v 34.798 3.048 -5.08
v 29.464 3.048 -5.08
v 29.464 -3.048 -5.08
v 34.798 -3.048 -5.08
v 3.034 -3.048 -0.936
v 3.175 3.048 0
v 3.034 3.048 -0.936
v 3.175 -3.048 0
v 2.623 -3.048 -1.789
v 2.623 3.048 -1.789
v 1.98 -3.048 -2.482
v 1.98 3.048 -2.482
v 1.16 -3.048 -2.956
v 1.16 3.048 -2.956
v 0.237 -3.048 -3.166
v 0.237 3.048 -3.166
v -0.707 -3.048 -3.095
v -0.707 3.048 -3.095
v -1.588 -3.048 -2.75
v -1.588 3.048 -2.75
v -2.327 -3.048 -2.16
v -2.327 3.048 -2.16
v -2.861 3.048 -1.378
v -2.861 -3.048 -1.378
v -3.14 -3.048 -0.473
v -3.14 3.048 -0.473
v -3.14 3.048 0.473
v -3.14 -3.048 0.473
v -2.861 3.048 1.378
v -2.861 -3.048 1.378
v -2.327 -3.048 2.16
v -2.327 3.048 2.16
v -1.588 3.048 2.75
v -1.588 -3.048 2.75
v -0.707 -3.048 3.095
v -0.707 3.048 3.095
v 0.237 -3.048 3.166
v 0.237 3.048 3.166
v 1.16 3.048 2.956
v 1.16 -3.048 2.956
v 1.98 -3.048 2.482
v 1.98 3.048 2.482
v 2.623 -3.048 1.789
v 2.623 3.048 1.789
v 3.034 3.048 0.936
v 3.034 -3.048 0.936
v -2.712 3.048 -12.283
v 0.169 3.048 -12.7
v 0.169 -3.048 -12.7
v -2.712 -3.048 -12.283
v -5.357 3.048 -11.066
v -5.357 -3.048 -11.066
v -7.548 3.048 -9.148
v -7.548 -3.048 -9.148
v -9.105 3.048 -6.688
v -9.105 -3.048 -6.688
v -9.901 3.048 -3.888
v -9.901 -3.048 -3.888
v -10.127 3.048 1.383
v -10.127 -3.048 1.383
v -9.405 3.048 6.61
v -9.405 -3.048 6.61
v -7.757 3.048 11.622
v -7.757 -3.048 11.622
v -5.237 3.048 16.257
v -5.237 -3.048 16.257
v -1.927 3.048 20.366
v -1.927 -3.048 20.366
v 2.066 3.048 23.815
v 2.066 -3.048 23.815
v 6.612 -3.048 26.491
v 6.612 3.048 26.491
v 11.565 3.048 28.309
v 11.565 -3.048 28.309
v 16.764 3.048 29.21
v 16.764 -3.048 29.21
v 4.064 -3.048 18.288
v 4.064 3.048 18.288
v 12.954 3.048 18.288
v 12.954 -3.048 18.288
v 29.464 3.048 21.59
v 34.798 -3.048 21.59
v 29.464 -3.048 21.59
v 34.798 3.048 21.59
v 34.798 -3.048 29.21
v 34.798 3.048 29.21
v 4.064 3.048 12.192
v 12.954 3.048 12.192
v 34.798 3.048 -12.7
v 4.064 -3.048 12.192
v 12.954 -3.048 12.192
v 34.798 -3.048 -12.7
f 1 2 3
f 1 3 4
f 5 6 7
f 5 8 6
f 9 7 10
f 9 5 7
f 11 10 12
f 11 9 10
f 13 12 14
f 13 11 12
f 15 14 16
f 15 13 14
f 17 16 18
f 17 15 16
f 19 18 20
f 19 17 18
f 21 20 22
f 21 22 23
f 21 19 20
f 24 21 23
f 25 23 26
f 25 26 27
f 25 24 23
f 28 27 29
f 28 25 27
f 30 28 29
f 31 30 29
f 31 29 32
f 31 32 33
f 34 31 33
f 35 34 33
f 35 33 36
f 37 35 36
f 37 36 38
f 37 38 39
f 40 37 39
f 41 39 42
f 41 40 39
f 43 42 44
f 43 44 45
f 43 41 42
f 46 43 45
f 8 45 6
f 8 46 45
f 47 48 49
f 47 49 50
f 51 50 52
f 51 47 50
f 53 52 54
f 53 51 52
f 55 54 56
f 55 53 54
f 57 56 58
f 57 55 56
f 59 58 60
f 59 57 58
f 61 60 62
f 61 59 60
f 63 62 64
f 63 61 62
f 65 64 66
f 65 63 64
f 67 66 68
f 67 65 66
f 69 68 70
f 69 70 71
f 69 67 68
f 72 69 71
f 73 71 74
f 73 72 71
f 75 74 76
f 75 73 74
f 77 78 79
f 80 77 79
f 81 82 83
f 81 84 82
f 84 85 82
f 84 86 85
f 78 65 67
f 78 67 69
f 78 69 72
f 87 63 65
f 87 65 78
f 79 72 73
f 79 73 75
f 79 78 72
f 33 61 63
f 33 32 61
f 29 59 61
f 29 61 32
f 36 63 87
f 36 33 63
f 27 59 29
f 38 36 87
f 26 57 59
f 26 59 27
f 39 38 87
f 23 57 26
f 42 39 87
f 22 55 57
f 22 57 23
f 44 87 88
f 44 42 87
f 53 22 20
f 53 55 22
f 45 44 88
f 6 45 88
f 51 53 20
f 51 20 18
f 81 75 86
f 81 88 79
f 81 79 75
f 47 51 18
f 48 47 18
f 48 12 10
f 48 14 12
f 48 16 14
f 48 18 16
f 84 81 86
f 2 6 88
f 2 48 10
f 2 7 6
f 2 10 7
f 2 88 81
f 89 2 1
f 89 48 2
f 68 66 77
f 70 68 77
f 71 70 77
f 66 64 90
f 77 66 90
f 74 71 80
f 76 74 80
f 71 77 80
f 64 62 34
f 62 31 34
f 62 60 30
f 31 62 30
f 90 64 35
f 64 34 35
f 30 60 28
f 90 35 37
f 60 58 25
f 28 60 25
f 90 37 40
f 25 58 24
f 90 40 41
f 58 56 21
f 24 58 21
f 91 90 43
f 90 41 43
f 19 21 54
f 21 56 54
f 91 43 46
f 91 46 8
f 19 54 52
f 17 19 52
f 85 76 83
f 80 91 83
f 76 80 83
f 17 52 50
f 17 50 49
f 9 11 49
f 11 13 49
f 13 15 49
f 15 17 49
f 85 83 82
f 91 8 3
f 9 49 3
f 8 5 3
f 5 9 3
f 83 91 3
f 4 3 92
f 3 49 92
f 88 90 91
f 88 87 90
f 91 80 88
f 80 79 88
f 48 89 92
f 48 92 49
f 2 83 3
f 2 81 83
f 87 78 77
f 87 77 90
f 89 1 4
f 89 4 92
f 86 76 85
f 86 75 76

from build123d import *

# Parameters (mm, degrees)
SKETCH1_R           = 3.175
SKETCH1_W           = 8.89
SKETCH1_H           = 6.096
BOSS_EXTRUDE1_DEPTH = 3.048


with BuildPart() as part:
    # Sketch1 → Boss-Extrude1 (new, symmetric)
    with BuildSketch(Plane(origin=(0, 0, 0), x_dir=(1, 0, 0), z_dir=(0, 1, 0))):
        with BuildLine():
            Line((29.464, -21.59), (29.464, 5.08))
            Line((29.464, 5.08), (34.798, 5.08))
            Line((34.798, 5.08), (34.798, 12.7))
            Line((34.798, 12.7), (0.169222866, 12.7))
            ThreePointArc((0.169222866, 12.7), (-6.521515016, 10.185889524), (-9.900982384, 3.887800513))
            ThreePointArc((-9.900982384, 3.887800513), (-3.674965137, -18.386374523), (16.764, -29.21))
            Line((16.764, -29.21), (34.798, -29.21))
            Line((34.798, -29.21), (34.798, -21.59))
            Line((34.798, -21.59), (29.464, -21.59))
        make_face()
        Circle(SKETCH1_R, mode=Mode.SUBTRACT)
        with Locations((8.509, -15.24)):
            Rectangle(SKETCH1_W, SKETCH1_H, mode=Mode.SUBTRACT)
    extrude(amount=BOSS_EXTRUDE1_DEPTH, both=True)


solid = part.part
